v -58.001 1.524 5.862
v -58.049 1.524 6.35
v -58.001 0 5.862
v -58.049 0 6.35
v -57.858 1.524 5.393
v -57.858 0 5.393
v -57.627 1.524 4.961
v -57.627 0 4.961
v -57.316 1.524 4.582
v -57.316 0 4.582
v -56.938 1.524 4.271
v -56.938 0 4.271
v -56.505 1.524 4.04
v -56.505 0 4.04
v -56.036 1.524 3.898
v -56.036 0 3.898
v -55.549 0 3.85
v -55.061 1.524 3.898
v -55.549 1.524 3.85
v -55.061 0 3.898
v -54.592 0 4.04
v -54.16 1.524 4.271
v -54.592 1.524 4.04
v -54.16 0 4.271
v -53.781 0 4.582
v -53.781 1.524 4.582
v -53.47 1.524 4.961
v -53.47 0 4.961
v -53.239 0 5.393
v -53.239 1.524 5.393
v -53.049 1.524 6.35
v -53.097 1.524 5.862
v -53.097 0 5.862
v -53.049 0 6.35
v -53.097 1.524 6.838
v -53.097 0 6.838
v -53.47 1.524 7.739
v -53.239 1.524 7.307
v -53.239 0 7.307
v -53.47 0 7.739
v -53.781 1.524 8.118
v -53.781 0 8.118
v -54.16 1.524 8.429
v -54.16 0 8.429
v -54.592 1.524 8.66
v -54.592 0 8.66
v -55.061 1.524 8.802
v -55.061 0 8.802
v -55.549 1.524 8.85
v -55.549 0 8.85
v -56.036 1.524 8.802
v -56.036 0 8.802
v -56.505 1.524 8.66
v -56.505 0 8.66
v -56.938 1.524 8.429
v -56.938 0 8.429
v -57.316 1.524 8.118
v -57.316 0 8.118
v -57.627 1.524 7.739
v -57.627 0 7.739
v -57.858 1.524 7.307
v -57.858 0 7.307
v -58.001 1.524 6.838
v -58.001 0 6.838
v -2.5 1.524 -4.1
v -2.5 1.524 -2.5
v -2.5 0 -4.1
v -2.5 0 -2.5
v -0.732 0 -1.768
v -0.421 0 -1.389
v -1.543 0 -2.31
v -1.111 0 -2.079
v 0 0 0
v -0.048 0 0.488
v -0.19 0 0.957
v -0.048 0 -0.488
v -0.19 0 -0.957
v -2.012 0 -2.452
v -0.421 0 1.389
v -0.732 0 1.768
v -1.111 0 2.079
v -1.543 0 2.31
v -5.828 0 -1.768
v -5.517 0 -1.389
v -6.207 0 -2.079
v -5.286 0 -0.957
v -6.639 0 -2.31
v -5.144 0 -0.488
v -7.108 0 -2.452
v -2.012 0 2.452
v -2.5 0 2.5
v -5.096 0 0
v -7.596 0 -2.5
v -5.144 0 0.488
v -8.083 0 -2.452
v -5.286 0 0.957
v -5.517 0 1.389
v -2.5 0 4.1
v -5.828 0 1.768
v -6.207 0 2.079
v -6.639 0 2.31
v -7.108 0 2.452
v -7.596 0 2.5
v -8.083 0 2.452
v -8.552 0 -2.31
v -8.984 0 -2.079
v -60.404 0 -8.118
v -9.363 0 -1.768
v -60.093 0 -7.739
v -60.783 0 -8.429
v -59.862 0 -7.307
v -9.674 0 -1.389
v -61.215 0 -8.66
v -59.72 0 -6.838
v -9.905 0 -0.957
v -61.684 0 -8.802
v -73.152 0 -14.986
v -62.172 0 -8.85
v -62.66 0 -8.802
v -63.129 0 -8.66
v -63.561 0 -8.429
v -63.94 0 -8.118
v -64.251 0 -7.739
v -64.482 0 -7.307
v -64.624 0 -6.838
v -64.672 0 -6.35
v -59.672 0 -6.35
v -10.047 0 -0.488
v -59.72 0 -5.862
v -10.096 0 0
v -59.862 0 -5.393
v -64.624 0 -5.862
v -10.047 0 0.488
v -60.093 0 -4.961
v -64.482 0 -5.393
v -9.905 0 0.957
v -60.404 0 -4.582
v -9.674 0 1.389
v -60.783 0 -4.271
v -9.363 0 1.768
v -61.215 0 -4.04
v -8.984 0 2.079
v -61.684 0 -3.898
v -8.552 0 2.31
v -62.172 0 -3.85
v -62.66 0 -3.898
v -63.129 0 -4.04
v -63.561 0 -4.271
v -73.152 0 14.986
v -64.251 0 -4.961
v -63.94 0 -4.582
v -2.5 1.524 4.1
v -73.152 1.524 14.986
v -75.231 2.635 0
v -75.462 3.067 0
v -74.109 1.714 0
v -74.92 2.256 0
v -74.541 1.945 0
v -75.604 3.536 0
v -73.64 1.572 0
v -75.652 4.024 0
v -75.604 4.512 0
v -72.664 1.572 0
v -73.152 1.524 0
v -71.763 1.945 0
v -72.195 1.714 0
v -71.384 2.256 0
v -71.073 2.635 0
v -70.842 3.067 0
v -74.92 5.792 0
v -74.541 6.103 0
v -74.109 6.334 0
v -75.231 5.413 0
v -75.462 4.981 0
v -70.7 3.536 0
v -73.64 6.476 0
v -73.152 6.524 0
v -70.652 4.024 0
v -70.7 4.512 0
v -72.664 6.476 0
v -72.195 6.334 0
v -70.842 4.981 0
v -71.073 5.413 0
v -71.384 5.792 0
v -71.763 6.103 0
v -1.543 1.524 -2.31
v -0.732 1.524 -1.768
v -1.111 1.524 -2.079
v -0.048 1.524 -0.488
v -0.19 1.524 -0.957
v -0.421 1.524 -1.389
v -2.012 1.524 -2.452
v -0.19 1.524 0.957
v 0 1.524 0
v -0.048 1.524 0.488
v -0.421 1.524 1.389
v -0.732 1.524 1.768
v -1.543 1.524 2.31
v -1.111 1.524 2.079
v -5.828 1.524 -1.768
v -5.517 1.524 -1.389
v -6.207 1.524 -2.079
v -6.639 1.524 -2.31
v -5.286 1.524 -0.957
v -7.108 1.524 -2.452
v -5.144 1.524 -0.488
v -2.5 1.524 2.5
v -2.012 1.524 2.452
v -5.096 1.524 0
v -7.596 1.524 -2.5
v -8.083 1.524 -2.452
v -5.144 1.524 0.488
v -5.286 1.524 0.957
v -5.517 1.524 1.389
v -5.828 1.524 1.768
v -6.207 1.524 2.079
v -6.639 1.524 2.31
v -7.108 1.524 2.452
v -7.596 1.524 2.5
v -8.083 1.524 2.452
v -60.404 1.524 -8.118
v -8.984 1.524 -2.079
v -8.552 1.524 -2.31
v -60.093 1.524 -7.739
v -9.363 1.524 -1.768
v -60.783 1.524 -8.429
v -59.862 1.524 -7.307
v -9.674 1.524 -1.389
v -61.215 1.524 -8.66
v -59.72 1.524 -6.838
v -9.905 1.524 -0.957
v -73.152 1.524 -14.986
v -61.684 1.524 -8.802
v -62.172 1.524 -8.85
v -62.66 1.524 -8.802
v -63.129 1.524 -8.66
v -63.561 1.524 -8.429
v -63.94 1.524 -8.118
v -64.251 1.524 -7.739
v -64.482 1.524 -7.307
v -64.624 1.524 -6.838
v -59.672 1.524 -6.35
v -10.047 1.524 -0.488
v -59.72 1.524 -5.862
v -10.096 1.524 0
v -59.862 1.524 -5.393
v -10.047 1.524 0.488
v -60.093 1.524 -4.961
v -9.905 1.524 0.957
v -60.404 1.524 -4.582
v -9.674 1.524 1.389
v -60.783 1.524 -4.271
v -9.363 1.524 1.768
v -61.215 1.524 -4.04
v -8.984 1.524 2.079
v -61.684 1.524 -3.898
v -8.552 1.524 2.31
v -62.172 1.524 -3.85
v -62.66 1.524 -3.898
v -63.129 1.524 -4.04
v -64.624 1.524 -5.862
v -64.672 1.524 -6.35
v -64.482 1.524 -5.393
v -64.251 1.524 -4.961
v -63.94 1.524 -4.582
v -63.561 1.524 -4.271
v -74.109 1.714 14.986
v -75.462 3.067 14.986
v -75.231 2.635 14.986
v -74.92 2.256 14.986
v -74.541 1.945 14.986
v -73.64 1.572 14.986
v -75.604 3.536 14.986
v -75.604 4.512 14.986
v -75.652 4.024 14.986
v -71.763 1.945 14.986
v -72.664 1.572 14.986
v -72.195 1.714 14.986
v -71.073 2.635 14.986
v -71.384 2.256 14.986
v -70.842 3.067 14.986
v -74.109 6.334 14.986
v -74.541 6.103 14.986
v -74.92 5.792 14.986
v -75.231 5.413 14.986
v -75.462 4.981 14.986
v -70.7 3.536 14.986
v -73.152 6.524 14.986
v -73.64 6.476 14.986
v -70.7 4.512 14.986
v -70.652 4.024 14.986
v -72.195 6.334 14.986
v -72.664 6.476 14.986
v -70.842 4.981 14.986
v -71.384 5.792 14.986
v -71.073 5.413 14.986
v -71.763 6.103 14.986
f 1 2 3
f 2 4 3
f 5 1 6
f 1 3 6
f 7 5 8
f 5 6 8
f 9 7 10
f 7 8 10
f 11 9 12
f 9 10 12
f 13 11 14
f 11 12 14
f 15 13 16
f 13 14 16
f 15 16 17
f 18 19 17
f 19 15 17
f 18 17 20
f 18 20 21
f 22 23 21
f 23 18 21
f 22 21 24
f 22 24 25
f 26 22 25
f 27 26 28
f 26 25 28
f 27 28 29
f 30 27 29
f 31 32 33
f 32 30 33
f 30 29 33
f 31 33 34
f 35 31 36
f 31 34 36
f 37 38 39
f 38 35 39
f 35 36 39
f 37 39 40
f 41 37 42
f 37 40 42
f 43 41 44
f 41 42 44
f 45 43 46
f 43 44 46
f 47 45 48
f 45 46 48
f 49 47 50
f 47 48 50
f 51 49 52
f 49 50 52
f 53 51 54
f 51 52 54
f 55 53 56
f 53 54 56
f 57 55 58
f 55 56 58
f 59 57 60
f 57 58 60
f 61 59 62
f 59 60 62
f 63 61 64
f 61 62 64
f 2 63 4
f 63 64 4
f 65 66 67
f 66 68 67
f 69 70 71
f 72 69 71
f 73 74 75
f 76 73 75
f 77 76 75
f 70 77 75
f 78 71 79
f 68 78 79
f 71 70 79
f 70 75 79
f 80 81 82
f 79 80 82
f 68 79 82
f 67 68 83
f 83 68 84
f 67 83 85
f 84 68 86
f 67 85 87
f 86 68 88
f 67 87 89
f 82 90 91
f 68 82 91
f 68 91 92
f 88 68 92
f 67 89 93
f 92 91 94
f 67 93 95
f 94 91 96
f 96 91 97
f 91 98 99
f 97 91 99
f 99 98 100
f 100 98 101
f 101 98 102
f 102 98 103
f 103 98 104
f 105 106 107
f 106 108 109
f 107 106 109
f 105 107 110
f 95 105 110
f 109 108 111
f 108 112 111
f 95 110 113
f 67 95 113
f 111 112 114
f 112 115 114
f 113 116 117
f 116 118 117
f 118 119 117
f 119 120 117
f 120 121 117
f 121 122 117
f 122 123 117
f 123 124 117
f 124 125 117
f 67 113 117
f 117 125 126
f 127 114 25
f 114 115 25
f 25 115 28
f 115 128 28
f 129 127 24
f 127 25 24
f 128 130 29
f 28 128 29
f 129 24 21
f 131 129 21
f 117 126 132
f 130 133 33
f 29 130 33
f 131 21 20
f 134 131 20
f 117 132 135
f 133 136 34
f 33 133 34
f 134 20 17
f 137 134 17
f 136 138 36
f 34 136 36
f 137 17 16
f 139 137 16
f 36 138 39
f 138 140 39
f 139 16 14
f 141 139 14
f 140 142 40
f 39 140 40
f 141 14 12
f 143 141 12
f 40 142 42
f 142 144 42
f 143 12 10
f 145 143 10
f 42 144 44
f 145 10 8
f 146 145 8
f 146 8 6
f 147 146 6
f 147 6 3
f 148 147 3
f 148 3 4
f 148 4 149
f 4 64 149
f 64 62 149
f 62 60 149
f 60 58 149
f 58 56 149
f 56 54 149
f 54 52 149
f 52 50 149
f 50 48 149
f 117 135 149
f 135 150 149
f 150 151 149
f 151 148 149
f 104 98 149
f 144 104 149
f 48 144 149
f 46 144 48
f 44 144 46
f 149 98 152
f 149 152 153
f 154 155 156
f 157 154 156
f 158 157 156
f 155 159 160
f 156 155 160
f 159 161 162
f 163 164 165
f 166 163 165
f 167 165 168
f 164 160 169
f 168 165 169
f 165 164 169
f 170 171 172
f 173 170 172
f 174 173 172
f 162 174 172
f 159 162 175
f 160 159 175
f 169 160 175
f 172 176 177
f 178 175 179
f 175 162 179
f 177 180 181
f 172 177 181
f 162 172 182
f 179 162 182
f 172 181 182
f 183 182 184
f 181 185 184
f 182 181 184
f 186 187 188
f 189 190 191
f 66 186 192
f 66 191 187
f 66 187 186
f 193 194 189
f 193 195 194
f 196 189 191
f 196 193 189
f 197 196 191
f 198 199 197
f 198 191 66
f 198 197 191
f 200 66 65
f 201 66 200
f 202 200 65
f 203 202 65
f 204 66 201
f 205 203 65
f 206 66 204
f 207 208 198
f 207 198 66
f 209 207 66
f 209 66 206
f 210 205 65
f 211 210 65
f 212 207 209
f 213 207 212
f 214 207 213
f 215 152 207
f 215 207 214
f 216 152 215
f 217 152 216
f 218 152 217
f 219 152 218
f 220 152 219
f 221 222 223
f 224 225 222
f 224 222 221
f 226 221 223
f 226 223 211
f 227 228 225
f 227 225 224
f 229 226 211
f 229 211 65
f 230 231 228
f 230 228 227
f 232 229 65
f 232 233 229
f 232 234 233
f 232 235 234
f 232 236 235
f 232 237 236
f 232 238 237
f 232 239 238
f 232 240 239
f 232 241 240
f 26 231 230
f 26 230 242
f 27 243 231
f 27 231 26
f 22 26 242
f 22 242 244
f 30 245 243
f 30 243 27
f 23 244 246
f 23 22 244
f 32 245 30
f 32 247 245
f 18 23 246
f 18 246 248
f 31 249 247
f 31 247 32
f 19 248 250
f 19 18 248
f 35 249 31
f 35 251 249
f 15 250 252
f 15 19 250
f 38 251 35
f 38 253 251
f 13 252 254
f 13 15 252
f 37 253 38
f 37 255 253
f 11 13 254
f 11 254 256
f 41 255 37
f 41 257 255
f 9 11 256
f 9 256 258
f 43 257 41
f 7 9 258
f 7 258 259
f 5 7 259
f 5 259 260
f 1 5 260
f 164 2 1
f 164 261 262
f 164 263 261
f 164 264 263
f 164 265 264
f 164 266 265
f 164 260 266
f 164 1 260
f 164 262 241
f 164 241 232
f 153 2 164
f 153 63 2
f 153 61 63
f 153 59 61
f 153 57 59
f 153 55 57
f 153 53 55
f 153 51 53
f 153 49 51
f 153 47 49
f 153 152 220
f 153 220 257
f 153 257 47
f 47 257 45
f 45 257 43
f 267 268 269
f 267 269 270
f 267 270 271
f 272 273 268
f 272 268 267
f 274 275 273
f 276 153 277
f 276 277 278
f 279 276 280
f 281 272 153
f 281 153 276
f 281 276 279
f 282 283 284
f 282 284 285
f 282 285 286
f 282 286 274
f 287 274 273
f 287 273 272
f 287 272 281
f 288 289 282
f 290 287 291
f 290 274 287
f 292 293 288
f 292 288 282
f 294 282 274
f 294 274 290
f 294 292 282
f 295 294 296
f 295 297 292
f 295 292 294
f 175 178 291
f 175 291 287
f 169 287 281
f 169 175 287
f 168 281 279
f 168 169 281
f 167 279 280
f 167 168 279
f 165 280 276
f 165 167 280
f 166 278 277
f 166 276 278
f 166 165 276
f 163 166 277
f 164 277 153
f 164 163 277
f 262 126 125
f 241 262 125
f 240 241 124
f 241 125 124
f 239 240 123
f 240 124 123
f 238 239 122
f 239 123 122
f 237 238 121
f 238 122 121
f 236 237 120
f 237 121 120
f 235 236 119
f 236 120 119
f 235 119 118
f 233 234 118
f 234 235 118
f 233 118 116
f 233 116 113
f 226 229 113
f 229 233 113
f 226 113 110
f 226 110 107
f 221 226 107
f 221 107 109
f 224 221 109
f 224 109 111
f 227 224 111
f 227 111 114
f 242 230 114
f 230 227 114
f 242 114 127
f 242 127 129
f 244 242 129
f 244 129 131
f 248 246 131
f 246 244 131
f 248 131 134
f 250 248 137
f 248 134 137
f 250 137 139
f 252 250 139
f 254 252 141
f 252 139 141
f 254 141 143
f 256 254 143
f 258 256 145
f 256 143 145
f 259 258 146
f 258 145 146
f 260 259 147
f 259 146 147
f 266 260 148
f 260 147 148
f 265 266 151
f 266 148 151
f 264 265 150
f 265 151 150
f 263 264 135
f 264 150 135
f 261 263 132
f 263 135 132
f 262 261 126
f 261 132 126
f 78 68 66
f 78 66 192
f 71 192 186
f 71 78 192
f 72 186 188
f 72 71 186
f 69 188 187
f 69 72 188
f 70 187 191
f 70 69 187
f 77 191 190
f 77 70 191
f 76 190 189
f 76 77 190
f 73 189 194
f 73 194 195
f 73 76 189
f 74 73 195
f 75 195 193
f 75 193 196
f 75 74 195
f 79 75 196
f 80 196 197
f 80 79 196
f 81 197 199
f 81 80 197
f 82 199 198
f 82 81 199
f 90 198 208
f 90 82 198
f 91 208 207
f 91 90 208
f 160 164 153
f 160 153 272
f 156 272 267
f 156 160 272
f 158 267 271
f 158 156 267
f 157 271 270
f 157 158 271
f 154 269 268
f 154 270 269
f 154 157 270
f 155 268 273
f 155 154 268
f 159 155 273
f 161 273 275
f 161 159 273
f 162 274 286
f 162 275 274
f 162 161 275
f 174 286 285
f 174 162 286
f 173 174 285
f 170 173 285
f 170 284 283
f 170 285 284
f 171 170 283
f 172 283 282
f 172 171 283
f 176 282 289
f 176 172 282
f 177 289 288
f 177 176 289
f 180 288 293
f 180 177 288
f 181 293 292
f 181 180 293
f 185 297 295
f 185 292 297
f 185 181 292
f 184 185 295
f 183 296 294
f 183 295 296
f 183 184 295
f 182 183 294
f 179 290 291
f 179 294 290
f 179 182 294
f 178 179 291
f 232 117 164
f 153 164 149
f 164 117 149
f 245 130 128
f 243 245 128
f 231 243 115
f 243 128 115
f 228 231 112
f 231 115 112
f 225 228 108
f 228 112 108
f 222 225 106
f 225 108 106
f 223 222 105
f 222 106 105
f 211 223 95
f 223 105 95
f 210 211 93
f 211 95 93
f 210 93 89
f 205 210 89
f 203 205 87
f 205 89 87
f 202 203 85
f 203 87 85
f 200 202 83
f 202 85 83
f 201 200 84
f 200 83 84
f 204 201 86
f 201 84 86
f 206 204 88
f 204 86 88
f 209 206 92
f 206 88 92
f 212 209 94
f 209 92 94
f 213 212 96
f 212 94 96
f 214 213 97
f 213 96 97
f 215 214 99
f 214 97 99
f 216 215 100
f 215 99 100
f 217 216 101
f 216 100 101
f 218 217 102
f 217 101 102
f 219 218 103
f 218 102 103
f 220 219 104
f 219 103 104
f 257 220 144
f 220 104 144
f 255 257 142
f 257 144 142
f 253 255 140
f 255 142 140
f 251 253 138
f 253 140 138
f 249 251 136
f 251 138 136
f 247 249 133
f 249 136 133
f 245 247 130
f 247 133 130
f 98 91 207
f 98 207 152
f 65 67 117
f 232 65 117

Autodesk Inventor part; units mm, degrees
ref_plane "YZ Plane" through (0, 0, 0) normal (1, 0, 0) x (0, 1, 0)
ref_plane "XZ Plane" through (0, 0, 0) normal (0, 1, 0) x (-1, 0, 0)
ref_plane "XY Plane" through (0, 0, 0) normal (0, 0, 1) x (1, 0, 0)
sketch "Sketch1" plane through (0, 0, 0) normal (0, 1, 0) x (-1, 0, 0)
  line L0 (0, 0) -> (73.152, 0)
  line L1 (73.152, 0) -> (73.152, 14.986)
  line L2 (73.152, 14.986) -> (73.152, -14.986)
  circle A0 centre (2.5, 0) radius 2.5
  line L3 (2.5, -2.5) -> (2.5, -4.1002)
  line L4 (2.5, -4.1002) -> (73.152, -14.986)
  line L5 (2.5, 2.5) -> (2.5, 4.1002)
  line L6 (2.5, 4.1002) -> (73.152, 14.986)
  circle A1 centre (7.5955, 0) radius 2.5
  circle A2 centre (62.172, -6.35) radius 2.5
  circle A3 centre (55.5486, 6.35) radius 2.5
  dimension "d3" = 5
  dimension "d0" = 73.152
  dimension "d1" = 14.986
  dimension "d2" = 29.972
  dimension "d4" = 2.5
  dimension "d5" = 1.6002
  dimension "d6" = 5
  dimension "d7" = 5
  dimension "d8" = 5
  dimension "d9" = 6.35
  dimension "d10" = 6.35
extrude "Extrusion1" add sketch "Sketch1" along normal blind 1.524 contours A0 L0 | L0 A0 | A0 L5 L6 L1 L0 A1 | L0 A1 L2 L4 L3 A0
sketch "Sketch2" plane through (0, 0, 0) normal (0, 0, 1) x (1, 0, 0)
  line L0 (-73.152, 1.524) -> (-2.5, 1.524) projected
  line L1 (-73.152, 1.524) -> (-73.152, 4.024)
  circle A0 centre (-73.152, 4.024) radius 2.5
  point P0 (0, 0)
  dimension "d13" = 2.5
extrude "Extrusion2" add sketch "Sketch2" along normal up to surface (14.986 mm away)
properties part number "Hinge"
